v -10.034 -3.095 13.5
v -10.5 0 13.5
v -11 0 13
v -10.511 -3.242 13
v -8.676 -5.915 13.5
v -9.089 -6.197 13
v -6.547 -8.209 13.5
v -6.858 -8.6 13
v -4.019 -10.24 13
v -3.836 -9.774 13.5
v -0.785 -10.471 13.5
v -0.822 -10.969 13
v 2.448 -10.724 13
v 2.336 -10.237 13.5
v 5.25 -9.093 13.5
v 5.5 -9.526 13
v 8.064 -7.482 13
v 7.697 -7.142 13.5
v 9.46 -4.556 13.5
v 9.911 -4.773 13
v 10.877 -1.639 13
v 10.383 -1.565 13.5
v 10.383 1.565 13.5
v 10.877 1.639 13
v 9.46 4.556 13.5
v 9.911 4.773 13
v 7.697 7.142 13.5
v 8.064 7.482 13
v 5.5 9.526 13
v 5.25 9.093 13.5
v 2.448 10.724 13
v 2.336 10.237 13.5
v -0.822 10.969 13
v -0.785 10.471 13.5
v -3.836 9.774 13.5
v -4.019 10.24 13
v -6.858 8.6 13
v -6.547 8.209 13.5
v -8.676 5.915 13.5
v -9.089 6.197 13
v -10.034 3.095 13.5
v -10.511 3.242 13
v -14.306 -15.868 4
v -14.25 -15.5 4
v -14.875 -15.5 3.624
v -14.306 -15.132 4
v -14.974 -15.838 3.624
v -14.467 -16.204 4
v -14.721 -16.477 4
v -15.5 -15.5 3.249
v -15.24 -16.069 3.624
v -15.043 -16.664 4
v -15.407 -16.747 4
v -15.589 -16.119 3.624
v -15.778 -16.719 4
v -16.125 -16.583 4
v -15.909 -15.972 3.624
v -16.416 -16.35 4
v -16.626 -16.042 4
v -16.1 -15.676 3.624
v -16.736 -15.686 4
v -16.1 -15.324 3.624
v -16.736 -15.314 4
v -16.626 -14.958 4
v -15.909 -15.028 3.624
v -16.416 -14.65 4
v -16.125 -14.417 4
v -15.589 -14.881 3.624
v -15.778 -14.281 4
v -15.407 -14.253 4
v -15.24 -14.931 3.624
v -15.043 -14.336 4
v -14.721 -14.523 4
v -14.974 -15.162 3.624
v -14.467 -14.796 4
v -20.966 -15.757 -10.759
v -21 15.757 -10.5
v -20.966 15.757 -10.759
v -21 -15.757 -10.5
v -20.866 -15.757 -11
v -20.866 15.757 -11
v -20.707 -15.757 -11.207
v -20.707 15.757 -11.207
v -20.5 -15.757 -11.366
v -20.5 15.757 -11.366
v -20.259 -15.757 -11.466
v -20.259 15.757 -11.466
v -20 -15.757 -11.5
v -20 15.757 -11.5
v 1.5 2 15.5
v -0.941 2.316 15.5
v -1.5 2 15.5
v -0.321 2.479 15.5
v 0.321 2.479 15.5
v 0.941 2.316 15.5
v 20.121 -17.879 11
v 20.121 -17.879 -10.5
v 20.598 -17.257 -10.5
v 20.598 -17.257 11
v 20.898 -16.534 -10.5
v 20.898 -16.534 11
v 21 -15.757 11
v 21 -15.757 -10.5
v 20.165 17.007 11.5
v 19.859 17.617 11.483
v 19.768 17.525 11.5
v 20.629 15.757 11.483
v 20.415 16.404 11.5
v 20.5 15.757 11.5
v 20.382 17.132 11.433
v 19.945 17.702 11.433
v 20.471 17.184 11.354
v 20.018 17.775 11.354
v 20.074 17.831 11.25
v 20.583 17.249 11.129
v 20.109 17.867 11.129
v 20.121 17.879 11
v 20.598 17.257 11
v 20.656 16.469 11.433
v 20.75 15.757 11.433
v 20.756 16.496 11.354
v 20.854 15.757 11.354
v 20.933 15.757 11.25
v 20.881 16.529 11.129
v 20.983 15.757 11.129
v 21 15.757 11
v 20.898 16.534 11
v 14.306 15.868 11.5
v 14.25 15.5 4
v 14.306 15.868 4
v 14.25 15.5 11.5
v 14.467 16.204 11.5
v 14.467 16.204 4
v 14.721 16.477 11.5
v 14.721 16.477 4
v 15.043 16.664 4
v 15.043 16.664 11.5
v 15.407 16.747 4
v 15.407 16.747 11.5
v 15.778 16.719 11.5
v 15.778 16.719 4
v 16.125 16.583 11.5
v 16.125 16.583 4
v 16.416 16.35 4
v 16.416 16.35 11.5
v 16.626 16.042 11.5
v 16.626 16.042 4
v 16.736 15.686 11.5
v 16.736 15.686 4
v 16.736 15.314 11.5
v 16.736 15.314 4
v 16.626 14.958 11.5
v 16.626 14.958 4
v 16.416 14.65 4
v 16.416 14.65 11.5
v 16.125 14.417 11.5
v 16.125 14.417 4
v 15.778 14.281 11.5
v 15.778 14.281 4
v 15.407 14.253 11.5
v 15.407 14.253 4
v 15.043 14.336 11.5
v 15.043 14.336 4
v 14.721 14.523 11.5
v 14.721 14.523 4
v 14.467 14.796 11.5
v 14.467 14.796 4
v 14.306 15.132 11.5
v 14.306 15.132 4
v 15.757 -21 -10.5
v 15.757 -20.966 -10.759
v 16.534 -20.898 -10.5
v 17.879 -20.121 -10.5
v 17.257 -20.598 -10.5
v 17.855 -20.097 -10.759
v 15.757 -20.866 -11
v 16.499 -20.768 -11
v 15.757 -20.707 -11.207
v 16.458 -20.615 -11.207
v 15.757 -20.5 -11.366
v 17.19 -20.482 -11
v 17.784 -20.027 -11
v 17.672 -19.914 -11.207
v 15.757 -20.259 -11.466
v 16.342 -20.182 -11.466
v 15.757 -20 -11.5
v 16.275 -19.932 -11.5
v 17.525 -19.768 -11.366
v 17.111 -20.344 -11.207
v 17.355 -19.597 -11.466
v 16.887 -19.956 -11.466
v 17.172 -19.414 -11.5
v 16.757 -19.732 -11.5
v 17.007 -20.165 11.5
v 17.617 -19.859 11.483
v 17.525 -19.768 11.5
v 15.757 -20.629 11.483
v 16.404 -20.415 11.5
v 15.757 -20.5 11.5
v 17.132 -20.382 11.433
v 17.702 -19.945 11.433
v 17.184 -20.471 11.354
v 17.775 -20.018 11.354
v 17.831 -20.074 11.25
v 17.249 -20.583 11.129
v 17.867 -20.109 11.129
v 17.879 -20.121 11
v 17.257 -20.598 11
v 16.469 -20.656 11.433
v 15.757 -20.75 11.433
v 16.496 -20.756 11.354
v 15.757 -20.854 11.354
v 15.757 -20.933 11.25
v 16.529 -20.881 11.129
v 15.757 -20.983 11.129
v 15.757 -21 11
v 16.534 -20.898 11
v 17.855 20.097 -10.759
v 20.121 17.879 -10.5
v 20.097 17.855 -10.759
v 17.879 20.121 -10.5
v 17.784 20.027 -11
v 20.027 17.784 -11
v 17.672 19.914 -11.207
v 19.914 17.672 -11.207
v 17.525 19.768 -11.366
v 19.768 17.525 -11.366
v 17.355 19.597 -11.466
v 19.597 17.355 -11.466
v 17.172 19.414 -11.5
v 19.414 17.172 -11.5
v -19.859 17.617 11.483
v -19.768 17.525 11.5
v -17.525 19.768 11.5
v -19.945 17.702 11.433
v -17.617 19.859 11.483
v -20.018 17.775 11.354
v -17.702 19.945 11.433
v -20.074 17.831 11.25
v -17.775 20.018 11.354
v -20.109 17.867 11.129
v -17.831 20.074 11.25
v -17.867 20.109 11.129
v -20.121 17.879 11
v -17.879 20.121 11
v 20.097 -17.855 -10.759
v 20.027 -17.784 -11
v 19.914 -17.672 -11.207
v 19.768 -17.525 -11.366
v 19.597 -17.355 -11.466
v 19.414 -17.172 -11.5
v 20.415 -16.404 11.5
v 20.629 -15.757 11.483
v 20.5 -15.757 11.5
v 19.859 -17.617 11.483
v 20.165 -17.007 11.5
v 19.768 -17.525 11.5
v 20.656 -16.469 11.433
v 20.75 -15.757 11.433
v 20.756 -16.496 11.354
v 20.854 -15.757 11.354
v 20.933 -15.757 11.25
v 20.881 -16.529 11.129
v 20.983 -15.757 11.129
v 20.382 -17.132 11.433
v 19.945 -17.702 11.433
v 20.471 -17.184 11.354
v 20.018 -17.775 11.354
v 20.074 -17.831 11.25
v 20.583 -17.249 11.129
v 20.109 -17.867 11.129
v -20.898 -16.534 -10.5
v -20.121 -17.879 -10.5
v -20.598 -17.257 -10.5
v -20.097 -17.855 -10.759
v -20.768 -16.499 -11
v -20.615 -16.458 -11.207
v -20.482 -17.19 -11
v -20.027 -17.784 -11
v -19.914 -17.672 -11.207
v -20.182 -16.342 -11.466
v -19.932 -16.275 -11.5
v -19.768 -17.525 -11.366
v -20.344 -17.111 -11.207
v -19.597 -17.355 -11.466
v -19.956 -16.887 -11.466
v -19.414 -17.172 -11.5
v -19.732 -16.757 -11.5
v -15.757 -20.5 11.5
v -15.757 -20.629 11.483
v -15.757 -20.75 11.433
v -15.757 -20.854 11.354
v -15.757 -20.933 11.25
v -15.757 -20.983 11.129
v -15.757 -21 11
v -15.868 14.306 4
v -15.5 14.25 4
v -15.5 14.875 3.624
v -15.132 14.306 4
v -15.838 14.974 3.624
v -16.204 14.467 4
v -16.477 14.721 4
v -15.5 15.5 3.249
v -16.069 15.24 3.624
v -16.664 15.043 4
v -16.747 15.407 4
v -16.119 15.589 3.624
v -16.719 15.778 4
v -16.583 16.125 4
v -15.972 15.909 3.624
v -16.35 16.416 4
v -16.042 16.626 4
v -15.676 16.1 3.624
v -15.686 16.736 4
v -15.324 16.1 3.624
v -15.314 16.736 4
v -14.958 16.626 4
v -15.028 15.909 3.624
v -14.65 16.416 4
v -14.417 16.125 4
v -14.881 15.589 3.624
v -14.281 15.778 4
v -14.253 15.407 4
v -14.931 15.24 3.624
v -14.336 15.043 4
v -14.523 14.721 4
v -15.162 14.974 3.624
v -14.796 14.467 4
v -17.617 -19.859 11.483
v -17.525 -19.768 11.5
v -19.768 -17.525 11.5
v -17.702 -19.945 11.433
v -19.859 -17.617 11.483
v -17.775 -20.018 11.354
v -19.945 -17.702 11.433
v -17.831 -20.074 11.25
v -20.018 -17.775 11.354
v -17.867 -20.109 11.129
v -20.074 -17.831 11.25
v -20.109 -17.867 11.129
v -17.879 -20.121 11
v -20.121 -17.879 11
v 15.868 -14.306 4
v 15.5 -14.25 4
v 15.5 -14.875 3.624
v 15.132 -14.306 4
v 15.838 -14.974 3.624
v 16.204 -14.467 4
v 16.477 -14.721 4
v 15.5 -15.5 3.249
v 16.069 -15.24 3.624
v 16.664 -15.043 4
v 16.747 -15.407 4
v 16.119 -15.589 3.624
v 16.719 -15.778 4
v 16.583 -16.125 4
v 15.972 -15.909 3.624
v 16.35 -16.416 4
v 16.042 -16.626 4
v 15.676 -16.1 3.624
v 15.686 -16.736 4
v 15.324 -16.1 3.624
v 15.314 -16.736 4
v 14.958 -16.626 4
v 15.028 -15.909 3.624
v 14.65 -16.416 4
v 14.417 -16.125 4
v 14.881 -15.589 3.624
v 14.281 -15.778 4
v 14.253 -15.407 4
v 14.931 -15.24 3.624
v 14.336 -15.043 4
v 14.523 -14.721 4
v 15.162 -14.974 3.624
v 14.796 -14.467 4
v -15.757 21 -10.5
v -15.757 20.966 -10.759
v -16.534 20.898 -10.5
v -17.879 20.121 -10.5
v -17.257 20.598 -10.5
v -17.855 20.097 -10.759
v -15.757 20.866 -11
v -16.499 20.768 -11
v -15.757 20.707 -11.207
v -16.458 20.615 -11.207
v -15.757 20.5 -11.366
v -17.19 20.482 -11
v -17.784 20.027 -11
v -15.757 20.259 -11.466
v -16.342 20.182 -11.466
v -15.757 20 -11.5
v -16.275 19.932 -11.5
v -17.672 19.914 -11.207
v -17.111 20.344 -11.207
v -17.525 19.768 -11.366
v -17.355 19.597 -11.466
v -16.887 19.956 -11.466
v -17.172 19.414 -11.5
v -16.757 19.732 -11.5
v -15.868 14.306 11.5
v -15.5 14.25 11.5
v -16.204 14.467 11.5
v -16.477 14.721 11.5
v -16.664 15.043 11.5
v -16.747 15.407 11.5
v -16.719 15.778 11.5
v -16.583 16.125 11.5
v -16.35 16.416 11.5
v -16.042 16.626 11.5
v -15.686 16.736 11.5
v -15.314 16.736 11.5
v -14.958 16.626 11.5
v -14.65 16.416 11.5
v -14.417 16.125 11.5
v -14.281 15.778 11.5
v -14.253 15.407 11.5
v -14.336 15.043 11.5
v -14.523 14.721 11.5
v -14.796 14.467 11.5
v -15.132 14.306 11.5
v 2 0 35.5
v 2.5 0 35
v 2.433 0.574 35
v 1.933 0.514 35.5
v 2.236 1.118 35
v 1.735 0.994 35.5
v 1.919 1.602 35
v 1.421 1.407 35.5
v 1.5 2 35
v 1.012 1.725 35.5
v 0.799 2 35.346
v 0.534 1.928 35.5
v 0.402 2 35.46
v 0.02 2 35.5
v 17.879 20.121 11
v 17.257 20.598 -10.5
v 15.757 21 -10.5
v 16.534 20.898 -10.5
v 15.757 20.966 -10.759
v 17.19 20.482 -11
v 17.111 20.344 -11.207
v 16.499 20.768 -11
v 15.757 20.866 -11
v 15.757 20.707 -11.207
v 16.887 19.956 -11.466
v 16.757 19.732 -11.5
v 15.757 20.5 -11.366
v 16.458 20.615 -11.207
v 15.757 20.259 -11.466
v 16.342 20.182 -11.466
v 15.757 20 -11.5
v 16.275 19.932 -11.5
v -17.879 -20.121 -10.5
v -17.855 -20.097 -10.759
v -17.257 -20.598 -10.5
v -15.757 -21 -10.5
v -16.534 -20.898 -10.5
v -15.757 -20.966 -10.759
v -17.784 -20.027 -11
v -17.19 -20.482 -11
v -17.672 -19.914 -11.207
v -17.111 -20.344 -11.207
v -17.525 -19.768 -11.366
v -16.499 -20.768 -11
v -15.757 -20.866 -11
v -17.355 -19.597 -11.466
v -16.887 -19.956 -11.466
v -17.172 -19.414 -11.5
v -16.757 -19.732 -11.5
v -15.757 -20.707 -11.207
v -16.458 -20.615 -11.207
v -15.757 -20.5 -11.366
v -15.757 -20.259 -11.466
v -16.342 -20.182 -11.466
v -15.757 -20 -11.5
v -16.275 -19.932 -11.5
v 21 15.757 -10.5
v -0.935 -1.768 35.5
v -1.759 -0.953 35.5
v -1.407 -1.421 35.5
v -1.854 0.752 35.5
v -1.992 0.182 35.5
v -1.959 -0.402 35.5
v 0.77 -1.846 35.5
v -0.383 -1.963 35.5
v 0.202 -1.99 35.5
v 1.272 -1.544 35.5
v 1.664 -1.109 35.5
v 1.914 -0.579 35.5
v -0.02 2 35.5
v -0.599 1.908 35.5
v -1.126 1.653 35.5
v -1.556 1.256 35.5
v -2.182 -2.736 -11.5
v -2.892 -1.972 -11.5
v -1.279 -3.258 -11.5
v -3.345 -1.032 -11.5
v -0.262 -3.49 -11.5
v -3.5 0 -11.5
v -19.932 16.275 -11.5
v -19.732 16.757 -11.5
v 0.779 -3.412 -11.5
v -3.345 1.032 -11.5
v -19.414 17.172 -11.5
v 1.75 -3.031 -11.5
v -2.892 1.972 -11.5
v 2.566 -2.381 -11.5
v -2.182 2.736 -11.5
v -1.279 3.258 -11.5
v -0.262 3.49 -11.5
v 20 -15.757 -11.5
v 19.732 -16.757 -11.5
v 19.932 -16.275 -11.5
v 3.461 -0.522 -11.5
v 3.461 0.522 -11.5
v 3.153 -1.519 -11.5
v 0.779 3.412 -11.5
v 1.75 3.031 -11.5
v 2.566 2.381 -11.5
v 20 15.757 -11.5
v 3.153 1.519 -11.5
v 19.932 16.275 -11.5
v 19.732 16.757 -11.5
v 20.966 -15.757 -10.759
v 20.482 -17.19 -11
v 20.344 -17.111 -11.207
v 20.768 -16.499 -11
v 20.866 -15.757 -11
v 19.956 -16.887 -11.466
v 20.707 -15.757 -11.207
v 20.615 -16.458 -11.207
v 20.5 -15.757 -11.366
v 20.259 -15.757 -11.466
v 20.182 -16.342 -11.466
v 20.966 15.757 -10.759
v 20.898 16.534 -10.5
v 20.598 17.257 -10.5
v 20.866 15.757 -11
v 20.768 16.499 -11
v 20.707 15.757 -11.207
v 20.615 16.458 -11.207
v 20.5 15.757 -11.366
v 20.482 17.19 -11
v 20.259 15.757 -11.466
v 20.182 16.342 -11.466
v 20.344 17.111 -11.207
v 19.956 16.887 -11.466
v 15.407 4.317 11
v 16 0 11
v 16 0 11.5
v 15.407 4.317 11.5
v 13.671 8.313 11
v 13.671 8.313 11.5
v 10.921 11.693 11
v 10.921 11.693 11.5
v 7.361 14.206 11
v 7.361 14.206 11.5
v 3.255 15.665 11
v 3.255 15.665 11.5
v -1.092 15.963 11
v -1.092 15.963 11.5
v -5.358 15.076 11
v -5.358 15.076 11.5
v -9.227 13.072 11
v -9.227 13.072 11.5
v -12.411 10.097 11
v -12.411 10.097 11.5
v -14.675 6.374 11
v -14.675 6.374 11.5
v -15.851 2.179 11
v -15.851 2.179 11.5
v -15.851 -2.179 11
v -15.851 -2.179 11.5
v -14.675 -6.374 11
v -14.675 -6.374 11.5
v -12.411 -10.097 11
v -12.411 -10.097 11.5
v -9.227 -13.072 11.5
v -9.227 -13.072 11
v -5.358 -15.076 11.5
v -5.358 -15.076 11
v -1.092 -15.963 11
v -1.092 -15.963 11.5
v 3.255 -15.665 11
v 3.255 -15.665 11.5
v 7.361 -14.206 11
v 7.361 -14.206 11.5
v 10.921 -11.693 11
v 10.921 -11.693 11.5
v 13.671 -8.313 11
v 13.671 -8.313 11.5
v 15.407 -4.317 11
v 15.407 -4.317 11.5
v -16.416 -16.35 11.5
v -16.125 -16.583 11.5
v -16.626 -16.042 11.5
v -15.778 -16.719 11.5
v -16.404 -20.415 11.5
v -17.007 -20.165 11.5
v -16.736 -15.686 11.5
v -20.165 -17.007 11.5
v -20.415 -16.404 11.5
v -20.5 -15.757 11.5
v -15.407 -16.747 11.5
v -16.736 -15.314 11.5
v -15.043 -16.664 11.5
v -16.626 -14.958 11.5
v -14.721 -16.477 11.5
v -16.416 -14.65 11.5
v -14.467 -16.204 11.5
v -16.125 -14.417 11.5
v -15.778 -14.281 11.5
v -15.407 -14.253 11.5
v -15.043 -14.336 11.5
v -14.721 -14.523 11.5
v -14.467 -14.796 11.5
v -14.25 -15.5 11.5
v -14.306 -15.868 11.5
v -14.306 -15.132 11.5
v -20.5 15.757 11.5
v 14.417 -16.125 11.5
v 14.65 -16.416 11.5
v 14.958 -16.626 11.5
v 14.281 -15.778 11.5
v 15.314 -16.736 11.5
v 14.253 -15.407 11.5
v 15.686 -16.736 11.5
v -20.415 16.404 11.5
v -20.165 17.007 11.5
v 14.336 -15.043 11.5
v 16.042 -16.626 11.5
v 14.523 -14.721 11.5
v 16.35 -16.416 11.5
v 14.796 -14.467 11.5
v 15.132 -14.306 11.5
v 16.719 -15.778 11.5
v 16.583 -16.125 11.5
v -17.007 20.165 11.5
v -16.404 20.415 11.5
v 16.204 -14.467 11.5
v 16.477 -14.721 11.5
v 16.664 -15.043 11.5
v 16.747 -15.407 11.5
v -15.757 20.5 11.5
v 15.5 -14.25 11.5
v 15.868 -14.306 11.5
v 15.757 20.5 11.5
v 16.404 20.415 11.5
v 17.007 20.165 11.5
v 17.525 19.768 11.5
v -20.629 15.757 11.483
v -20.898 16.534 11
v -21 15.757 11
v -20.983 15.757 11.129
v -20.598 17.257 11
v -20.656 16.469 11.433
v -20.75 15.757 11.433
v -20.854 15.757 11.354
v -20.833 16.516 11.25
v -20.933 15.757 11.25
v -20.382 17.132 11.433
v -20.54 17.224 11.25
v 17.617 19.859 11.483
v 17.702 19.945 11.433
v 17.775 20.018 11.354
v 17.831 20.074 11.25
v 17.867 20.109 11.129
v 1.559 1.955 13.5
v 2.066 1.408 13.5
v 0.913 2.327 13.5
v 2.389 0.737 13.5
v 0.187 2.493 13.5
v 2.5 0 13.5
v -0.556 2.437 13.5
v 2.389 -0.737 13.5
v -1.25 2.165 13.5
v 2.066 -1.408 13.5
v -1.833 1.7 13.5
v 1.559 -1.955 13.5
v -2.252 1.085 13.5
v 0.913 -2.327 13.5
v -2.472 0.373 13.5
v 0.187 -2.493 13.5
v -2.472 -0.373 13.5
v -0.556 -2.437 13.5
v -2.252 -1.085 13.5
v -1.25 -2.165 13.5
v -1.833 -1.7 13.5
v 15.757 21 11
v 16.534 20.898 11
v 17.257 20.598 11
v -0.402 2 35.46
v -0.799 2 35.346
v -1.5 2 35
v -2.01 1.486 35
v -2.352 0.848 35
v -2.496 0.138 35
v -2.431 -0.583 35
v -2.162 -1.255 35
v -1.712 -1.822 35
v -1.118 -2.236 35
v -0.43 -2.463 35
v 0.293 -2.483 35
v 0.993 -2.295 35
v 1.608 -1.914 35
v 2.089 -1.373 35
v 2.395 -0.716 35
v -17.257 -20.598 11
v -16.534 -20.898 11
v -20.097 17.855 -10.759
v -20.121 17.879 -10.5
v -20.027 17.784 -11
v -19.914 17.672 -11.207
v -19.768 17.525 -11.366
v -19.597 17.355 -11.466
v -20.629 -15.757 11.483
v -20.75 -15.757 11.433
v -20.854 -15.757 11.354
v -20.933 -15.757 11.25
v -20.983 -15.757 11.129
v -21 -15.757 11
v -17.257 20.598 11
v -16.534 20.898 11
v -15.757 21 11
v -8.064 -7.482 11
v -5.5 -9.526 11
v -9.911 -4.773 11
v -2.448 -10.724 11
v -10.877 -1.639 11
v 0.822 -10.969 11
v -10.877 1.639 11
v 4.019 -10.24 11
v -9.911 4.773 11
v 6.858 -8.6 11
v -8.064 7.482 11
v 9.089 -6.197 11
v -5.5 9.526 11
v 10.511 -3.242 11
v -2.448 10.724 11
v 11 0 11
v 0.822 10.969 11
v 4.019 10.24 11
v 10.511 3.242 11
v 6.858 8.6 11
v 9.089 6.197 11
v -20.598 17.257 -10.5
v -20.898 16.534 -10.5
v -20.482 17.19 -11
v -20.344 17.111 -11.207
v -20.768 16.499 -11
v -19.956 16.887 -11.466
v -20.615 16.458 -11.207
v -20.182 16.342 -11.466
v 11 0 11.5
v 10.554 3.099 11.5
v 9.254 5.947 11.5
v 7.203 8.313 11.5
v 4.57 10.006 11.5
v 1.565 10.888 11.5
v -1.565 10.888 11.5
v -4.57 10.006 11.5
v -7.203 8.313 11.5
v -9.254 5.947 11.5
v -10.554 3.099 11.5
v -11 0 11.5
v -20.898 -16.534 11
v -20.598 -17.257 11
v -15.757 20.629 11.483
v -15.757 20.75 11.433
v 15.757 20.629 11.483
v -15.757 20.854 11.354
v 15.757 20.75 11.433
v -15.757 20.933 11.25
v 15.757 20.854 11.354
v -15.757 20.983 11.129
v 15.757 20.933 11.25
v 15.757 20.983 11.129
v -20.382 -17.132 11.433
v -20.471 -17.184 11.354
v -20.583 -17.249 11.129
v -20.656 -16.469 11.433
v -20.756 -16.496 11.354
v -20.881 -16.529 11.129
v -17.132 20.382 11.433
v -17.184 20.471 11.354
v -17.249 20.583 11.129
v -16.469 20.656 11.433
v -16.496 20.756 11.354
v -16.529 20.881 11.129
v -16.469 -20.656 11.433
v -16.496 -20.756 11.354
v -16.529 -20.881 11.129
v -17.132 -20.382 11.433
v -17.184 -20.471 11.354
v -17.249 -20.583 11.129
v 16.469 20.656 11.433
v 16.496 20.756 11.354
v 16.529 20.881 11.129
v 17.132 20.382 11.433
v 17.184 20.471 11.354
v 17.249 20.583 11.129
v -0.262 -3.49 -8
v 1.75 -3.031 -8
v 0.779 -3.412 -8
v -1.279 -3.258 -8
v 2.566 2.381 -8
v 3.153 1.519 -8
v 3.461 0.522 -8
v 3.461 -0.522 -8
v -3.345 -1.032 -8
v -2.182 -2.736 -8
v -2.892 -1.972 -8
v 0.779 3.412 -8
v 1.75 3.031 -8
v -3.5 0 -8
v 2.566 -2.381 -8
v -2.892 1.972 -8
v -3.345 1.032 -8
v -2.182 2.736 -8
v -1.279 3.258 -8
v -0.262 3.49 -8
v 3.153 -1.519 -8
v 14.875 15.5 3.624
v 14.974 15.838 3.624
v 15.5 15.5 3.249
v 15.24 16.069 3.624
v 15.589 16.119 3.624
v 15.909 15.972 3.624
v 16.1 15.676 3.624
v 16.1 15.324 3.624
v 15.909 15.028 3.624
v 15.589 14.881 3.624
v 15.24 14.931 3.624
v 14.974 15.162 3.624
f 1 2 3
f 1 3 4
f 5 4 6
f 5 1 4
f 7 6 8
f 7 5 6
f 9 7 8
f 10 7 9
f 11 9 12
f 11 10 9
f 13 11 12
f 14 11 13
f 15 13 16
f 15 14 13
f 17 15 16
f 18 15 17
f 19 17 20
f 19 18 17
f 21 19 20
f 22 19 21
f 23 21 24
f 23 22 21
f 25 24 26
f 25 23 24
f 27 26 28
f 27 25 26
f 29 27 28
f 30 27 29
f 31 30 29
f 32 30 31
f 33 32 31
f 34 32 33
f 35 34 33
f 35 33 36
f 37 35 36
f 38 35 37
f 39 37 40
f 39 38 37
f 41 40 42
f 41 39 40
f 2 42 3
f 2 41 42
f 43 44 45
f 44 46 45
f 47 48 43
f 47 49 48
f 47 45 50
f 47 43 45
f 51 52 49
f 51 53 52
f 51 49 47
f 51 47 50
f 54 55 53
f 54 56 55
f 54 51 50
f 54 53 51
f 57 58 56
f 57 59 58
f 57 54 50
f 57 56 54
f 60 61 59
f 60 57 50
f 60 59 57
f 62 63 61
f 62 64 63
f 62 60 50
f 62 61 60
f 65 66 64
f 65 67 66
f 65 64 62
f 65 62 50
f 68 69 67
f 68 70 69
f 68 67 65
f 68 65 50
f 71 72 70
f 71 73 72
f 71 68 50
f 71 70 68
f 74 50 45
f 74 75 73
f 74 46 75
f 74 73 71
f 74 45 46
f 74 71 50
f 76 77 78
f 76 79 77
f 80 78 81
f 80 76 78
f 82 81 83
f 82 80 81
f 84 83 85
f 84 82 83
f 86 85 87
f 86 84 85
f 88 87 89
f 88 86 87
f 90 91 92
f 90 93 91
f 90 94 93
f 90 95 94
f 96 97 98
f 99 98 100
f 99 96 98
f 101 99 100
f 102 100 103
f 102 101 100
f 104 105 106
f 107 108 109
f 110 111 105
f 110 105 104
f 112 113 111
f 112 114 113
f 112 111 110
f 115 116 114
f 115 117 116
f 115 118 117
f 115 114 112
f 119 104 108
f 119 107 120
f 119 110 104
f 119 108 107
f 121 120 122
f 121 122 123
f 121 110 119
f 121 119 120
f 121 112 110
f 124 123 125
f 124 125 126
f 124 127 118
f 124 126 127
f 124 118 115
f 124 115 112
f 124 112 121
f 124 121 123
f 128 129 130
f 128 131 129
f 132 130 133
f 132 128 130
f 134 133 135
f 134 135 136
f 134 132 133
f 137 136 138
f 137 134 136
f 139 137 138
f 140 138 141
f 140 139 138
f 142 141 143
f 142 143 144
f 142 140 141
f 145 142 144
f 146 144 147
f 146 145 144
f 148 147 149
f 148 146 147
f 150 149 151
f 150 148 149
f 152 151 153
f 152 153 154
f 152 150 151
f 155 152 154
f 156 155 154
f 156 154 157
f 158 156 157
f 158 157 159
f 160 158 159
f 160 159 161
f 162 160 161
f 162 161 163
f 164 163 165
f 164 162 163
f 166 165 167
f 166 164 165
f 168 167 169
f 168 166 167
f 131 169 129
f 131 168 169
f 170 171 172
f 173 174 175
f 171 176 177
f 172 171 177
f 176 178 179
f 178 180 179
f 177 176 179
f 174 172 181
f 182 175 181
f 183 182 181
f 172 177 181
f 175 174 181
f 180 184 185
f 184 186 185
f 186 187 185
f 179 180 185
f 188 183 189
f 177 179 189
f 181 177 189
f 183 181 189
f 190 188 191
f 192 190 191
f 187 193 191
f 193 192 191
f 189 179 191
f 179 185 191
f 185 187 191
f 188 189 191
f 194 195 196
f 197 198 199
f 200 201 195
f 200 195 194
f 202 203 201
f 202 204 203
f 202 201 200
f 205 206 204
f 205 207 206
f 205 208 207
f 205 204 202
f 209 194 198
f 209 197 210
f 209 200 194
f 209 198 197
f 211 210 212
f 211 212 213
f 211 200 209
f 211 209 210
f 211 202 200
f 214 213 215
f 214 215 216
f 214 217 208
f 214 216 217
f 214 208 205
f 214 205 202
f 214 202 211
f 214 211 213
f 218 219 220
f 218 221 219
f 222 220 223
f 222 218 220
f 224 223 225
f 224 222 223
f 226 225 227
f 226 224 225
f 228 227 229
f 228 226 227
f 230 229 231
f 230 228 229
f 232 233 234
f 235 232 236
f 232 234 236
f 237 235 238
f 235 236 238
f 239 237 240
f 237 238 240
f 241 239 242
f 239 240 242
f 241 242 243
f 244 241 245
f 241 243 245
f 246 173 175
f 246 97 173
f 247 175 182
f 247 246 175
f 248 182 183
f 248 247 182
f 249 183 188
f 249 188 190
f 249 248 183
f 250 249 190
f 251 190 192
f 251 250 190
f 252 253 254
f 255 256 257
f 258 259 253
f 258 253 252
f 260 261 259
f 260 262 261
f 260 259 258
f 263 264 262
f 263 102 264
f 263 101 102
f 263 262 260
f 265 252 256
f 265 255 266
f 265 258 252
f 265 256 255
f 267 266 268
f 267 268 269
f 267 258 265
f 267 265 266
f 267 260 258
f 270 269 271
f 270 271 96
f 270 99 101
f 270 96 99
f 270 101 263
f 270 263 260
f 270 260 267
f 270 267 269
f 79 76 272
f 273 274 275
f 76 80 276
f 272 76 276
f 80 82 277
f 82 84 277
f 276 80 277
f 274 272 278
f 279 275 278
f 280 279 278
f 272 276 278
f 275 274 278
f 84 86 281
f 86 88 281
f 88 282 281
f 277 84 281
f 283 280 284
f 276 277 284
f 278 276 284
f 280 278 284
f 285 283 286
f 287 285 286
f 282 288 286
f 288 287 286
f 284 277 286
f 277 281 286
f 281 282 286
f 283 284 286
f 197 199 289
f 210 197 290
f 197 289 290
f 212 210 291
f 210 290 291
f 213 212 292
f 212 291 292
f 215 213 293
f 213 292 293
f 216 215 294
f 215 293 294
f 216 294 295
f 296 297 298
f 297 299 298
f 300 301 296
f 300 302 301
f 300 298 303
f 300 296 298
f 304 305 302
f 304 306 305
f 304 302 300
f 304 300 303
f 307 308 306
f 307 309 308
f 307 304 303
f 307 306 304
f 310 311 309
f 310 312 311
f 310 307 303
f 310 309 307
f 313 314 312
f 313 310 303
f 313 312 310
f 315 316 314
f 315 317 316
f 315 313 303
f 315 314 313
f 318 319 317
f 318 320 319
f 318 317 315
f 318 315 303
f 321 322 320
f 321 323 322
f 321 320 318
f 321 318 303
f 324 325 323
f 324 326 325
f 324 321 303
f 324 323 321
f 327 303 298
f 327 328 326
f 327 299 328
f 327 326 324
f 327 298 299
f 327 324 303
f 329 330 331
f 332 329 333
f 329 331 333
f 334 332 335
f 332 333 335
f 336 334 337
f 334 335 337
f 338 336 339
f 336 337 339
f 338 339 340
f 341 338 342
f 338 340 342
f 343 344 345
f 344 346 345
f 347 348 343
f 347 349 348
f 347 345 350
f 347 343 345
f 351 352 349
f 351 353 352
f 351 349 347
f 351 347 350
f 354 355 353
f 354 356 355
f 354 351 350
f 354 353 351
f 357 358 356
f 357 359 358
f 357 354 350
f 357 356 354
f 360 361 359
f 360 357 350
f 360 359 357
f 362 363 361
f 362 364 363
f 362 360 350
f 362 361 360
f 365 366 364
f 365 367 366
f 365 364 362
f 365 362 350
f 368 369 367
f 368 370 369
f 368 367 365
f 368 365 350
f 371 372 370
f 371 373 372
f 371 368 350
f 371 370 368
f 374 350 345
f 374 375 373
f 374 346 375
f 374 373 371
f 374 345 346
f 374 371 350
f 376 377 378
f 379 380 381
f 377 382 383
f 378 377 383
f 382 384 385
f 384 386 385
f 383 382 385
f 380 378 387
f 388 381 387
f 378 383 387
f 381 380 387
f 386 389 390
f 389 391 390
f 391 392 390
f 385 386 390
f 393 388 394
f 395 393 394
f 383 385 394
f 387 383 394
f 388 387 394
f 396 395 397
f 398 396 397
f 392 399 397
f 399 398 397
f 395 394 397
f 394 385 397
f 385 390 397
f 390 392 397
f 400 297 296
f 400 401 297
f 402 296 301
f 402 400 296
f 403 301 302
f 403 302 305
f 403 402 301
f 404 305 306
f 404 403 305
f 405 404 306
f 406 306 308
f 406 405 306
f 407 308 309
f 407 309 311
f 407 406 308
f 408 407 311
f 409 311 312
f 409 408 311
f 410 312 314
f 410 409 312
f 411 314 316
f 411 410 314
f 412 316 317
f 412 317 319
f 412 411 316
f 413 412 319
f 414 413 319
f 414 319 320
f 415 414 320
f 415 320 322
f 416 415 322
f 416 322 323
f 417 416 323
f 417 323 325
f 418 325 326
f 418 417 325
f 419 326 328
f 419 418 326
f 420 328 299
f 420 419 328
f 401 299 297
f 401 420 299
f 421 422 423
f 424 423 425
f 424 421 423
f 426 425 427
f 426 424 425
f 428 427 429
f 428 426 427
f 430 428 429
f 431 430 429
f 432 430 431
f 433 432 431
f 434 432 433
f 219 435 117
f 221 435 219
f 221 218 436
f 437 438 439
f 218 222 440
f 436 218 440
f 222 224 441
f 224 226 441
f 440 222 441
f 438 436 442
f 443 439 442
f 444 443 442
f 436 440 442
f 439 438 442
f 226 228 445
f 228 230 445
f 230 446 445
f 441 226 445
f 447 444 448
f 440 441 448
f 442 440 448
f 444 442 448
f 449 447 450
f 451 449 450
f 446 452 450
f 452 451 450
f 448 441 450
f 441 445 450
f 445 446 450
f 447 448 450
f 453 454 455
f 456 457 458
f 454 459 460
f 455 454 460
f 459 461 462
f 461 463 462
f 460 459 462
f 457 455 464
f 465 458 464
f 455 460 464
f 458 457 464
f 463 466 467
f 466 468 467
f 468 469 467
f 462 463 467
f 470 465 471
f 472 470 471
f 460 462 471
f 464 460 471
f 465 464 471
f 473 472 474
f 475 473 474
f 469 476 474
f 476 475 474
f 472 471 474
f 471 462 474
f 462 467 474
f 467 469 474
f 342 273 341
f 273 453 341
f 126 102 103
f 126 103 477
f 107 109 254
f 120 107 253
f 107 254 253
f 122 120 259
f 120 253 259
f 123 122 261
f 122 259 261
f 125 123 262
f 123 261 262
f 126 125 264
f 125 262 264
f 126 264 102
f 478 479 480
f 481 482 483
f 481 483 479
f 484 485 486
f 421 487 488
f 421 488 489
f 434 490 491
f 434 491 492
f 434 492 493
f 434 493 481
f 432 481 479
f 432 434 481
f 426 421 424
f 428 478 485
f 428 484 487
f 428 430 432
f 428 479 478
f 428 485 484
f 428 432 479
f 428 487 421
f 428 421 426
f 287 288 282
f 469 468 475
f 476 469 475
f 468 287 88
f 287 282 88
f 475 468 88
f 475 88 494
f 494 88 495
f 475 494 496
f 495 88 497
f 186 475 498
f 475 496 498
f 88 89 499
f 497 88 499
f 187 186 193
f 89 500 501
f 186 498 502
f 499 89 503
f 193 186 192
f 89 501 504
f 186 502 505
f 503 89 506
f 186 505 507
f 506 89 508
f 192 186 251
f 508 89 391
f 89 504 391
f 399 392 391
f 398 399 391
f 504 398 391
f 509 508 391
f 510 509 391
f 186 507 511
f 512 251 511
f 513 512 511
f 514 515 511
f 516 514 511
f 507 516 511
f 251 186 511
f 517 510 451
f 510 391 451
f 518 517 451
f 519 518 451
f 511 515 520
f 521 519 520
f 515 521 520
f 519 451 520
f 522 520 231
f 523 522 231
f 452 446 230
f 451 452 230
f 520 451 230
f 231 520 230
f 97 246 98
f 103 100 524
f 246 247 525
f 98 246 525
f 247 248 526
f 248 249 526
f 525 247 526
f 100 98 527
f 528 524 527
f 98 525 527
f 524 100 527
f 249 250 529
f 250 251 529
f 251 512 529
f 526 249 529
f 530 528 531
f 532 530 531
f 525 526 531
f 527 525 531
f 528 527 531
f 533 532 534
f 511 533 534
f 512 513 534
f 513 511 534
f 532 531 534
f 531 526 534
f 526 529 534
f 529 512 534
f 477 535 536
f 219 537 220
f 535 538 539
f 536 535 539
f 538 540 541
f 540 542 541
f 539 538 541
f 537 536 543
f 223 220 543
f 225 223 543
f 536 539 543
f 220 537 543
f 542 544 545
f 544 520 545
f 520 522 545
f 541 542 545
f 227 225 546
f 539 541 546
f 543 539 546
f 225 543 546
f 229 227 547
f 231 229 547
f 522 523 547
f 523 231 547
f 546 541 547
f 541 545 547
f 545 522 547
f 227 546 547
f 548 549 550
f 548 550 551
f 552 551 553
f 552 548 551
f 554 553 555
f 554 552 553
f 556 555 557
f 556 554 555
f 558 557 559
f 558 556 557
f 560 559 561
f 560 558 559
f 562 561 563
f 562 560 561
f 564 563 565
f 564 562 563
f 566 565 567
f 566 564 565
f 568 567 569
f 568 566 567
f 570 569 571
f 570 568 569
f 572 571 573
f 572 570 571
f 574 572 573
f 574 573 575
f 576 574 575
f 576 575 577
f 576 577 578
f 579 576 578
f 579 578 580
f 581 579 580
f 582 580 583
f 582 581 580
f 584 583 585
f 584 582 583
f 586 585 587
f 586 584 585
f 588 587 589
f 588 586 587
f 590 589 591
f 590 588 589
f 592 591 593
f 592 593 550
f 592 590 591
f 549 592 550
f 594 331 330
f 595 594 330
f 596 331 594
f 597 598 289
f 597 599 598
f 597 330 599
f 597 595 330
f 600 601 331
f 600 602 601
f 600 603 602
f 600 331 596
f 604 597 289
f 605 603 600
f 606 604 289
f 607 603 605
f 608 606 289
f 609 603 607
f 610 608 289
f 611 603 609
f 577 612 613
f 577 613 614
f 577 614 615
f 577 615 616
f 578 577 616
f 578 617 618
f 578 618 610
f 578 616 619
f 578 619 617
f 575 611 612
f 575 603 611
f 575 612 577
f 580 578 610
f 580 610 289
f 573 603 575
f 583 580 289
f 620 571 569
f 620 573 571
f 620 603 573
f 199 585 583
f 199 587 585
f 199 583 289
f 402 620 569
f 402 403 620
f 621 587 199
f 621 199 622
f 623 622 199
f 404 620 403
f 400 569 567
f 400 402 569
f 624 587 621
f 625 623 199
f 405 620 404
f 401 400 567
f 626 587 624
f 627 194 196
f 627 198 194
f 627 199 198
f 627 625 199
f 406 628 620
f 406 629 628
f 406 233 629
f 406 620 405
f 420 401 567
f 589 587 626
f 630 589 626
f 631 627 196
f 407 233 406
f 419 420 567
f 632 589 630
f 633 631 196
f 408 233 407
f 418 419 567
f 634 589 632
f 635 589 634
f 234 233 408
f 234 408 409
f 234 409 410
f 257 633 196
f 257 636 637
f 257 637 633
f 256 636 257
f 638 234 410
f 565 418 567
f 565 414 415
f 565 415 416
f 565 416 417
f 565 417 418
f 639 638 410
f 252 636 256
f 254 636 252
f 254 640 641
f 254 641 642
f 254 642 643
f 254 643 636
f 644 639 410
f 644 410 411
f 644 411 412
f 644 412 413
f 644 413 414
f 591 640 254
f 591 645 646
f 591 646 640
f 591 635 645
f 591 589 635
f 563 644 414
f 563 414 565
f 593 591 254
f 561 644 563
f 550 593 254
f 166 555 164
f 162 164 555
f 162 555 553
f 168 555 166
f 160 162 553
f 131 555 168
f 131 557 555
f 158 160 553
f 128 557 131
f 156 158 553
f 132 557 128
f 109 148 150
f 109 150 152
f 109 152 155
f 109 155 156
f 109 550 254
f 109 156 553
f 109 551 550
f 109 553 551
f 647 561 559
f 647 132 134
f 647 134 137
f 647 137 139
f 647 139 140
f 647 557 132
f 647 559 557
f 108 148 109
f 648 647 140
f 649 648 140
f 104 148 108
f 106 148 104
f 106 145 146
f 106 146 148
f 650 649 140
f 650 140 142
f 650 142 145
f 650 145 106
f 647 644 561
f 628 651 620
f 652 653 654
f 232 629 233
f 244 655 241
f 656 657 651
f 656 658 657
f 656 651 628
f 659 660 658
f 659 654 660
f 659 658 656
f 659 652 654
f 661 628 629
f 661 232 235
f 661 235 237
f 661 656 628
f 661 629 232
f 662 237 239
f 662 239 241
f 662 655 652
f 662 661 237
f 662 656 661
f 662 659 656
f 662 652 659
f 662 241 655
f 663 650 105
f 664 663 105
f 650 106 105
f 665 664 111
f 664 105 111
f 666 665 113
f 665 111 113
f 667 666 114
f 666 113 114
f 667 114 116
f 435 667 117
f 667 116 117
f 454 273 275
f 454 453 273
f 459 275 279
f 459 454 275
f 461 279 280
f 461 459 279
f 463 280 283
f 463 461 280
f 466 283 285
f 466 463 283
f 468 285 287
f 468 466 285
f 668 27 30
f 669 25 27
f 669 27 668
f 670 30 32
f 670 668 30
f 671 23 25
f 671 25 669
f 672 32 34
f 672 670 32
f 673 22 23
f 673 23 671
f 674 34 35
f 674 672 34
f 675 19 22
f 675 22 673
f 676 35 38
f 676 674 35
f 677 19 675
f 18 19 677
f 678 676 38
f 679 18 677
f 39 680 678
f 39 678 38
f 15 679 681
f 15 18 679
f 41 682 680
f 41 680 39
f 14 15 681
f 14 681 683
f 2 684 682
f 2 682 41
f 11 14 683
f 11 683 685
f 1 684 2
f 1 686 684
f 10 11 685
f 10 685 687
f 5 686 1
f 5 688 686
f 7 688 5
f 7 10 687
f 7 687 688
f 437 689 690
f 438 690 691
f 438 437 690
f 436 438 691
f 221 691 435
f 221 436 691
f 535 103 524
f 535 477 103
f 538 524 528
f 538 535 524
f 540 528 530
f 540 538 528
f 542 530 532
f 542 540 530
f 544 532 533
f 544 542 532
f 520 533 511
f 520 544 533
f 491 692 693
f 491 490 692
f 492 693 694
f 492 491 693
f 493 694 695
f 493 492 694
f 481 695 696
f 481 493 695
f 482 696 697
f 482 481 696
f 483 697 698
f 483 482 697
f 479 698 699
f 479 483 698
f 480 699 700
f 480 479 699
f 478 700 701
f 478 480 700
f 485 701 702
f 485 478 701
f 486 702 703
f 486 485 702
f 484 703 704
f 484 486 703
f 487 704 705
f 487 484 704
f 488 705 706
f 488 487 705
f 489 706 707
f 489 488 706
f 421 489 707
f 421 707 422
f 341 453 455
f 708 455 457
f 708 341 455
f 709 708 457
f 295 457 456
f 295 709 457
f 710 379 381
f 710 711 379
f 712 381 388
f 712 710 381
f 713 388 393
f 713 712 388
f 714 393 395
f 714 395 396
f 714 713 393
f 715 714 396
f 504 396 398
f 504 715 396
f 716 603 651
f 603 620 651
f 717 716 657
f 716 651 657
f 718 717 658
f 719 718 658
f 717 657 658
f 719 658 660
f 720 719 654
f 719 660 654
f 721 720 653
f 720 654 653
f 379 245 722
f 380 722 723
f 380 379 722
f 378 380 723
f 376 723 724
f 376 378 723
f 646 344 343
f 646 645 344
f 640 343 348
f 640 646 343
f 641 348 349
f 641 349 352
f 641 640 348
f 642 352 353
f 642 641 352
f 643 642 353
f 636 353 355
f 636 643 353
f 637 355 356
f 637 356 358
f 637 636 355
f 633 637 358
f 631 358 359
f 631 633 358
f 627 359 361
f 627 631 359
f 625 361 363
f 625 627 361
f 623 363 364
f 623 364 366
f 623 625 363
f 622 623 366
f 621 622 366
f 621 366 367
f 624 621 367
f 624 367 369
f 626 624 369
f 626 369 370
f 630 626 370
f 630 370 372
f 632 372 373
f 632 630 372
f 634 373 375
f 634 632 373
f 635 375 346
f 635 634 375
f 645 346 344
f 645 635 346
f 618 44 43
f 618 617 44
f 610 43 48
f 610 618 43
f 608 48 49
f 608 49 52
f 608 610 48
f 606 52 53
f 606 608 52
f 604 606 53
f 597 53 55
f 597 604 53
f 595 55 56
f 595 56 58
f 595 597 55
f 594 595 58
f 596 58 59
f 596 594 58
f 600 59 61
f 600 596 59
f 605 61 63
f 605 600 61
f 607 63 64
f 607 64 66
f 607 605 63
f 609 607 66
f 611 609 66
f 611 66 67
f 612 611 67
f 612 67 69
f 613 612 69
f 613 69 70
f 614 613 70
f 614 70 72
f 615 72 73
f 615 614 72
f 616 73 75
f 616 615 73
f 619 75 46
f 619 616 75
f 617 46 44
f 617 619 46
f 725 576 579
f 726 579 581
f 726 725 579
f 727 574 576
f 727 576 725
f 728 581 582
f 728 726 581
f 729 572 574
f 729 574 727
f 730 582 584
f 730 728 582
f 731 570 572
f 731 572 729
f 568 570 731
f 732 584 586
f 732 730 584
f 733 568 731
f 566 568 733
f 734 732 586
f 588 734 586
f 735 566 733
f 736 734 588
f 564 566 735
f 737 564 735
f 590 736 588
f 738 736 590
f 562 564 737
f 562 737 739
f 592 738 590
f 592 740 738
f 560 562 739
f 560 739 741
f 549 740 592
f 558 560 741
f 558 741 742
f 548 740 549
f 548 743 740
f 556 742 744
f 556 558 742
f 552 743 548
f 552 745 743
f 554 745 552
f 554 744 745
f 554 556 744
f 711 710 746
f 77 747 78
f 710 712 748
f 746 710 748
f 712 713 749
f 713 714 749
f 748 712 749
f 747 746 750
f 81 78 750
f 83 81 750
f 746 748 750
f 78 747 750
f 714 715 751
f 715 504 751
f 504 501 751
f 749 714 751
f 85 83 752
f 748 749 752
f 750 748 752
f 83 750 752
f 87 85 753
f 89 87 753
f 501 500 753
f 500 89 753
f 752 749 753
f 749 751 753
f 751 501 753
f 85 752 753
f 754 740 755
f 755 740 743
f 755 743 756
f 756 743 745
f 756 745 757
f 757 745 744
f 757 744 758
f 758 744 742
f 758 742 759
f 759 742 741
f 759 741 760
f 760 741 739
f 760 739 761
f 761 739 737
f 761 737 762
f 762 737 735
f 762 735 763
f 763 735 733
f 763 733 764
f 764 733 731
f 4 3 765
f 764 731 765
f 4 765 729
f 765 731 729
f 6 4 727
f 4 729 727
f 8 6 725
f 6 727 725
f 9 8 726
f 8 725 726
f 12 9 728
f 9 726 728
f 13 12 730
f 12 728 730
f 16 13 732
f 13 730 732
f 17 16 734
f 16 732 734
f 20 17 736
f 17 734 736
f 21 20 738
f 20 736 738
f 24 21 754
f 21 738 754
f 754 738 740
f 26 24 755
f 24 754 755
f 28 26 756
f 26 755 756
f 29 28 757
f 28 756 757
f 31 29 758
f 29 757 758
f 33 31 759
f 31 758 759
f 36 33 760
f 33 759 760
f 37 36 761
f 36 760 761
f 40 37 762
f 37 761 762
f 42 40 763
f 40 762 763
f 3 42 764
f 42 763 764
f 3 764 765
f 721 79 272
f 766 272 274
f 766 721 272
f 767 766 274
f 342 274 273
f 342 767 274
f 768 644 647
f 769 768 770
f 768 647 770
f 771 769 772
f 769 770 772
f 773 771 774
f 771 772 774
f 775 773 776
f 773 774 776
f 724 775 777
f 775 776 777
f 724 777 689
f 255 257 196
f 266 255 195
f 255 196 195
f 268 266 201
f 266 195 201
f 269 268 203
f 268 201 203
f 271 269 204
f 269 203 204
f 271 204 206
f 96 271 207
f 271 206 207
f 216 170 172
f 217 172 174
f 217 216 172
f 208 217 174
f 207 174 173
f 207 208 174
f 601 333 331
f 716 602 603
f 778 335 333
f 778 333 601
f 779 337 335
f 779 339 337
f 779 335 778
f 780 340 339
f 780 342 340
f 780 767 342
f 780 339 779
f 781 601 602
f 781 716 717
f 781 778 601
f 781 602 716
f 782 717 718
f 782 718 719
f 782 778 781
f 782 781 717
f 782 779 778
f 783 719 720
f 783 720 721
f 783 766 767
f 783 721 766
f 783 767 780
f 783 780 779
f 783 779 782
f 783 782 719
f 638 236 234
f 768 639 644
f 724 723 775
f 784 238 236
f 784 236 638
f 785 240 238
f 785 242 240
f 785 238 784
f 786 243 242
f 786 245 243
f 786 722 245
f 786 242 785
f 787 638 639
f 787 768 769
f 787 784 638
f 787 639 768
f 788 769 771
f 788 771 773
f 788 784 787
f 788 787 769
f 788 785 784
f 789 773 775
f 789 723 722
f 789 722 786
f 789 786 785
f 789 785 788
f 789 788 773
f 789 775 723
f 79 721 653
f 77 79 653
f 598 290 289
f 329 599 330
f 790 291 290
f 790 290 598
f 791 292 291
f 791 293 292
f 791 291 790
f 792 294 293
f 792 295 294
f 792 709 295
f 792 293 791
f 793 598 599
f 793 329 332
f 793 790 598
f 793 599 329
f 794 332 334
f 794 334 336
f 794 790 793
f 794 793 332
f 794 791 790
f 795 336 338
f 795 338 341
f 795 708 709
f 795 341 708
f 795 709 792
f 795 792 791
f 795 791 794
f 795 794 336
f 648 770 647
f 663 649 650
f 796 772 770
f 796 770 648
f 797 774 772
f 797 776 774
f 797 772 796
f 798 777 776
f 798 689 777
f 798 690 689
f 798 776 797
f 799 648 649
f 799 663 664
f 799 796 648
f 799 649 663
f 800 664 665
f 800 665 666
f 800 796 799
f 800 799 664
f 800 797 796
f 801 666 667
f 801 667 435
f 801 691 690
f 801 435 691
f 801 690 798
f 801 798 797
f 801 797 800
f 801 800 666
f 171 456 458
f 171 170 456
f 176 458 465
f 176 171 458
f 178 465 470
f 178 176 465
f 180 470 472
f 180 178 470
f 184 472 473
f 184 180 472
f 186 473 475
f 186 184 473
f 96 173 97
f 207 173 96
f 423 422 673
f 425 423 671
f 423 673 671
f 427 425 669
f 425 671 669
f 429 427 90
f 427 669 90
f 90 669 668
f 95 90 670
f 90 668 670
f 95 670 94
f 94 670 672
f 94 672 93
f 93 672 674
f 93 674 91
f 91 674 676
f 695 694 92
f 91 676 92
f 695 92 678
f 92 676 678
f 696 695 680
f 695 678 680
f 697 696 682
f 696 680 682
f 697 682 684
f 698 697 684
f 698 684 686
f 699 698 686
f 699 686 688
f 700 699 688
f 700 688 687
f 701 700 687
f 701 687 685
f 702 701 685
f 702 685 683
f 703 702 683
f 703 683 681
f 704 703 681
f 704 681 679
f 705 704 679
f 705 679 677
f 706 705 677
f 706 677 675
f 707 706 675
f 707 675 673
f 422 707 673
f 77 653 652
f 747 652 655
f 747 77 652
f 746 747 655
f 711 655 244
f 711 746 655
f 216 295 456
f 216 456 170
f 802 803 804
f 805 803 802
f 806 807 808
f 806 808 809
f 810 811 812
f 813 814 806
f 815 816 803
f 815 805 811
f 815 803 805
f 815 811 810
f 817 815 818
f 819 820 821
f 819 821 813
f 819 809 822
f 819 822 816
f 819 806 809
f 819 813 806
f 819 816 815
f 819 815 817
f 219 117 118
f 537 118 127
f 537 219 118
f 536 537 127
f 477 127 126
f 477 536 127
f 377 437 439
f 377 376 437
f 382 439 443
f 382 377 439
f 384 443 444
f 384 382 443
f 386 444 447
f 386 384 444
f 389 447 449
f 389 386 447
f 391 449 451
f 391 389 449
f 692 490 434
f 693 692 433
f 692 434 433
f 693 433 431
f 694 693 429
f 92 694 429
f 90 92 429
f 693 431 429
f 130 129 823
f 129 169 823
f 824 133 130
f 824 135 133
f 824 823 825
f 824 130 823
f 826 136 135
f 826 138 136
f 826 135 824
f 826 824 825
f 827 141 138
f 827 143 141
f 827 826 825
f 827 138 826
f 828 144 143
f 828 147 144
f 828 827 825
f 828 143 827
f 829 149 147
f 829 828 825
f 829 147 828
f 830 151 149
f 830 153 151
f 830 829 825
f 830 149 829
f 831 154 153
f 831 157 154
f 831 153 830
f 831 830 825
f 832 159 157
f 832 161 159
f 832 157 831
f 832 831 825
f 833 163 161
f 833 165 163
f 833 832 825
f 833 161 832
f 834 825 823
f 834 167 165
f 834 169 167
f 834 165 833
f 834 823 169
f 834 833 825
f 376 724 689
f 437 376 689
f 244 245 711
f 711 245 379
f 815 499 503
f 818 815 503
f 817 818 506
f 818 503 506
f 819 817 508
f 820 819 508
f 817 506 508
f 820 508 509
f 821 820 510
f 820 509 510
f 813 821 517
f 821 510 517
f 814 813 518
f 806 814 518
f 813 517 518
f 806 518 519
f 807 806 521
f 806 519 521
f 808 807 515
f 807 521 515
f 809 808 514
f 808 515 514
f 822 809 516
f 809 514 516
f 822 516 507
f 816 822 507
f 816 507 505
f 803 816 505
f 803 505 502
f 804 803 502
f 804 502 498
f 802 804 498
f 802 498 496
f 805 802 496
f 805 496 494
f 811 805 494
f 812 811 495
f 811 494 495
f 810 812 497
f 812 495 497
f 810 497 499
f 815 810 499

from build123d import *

# Parameters (mm, degrees)
SKETCH1_W           = 42
SKETCH1_H           = 42
BOSS_EXTRUDE1_DEPTH = 11.5
CHAMFER1_SIZE       = 4
SKETCH2_R           = 11
BOSS_EXTRUDE2_DEPTH = 2
CUT_EXTRUDE1_START  = -0.5
SKETCH3_R           = 16
SKETCH3_R_2         = 11
CUT_EXTRUDE1_DEPTH  = 0.5
SKETCH4_R           = 2.5
BOSS_EXTRUDE3_DEPTH = 22
SKETCH5_W           = 10.364275964
SKETCH5_H           = 1.526028363
CUT_EXTRUDE2_DEPTH  = 20
CIRPATTERN1_COUNT   = 4
FILLET1_R           = 3
CHAMFER2_SIZE       = 0.5
FILLET2_R           = 1
FILLET3_R           = 0.5
SKETCH9_R           = 3.5
CUT_EXTRUDE3_DEPTH  = 3.5


with BuildPart() as part:
    # Sketch1 → Boss-Extrude1 (new, symmetric)
    with BuildSketch(Plane.XY):
        Rectangle(SKETCH1_W, SKETCH1_H)
    extrude(amount=BOSS_EXTRUDE1_DEPTH, both=True)

    # Chamfer1
    chamfer1_edges = [part.edges().sort_by_distance(p)[0] for p in [
        (21, -21, 0),
        (-21, -21, 0),
        (-21, 21, 0),
        (21, 21, 0),
    ]]
    chamfer(chamfer1_edges, length=CHAMFER1_SIZE)

    # Sketch2 → Boss-Extrude2 (add)
    with BuildSketch(Plane.XY.offset(11.5)):
        with Locations(Location((0, 0, 0), (0, 0, 180))):
            Circle(SKETCH2_R)
    extrude(amount=BOSS_EXTRUDE2_DEPTH)

    # Sketch3 → Cut-Extrude1 (cut)
    with BuildSketch(Plane.XY.offset(11.5).offset(CUT_EXTRUDE1_START)):
        Circle(SKETCH3_R)
        Circle(SKETCH3_R_2, mode=Mode.SUBTRACT)
    extrude(amount=CUT_EXTRUDE1_DEPTH, mode=Mode.SUBTRACT)

    # Sketch4 → Boss-Extrude3 (add)
    with BuildSketch(Plane.XY.offset(13.5)):
        Circle(SKETCH4_R)
    extrude(amount=BOSS_EXTRUDE3_DEPTH)

    # Sketch5 → Cut-Extrude2 (cut)
    with BuildSketch(Plane.XY.offset(35.5)):
        with Locations((0.738499094, 2.763014181)):
            Rectangle(SKETCH5_W, SKETCH5_H)
    extrude(amount=-CUT_EXTRUDE2_DEPTH, mode=Mode.SUBTRACT)

    # Sketch7 → M3x0.5 Tapped Hole1 (revolve, cut)
    with BuildSketch(Plane(origin=(-15.5, 15.5, 11.5), x_dir=(0, -1, 0), z_dir=(1, 0, 0))):
        Polygon((0, 0), (0, 8.251075774), (1.25, 7.5), (1.25, 0), align=None)
    m3x0_5_tapped_hole1 = revolve(axis=Axis((-15.5, 15.5, 17.85), (0, 0, -1)), mode=Mode.SUBTRACT)

    # CirPattern1: M3x0.5 Tapped Hole1 ×4 about axis
    cirpattern1_axis = Axis((0, 0, 0), (0, 0, 1))
    for i in range(1, CIRPATTERN1_COUNT):
        add(m3x0_5_tapped_hole1.rotate(cirpattern1_axis, i * 360 / CIRPATTERN1_COUNT), mode=Mode.SUBTRACT)

    # Fillet1
    fillet1_edges = [part.edges().sort_by_distance(p)[0] for p in [
        (17, -21, 0),
        (-17, -21, 0),
        (-21, 17, 0),
        (-21, -17, 0),
        (21, 17, 0),
        (21, -17, 0),
        (17, 21, 0),
        (-17, 21, 0),
    ]]
    fillet(fillet1_edges, radius=FILLET1_R)

    # Chamfer2
    chamfer2_edges = [part.edges().sort_by_distance(p)[0] for p in [
        (-1.118033989, -2.236067977, 35.5),
        (11, 0, 13.5),
    ]]
    chamfer(chamfer2_edges, length=CHAMFER2_SIZE - 0.0001)  # a hair under: the kernel refuses the full size

    # Fillet2
    fillet2_edges = [part.edges().sort_by_distance(p)[0] for p in [
        (-19, -19, -11.5),
        (0, -21, -11.5),
        (-19, 19, -11.5),
        (0, 21, -11.5),
        (19, 19, -11.5),
        (21, 0, -11.5),
        (19, -19, -11.5),
        (-16.90540961, 20.771638598, -11.5),
        (-20.771638598, 16.90540961, -11.5),
        (16.90540961, 20.771638598, -11.5),
        (20.771638598, 16.90540961, -11.5),
        (20.771638598, -16.90540961, -11.5),
        (16.90540961, -20.771638598, -11.5),
        (-16.90540961, -20.771638598, -11.5),
        (-20.771638598, -16.90540961, -11.5),
        (-21, 0, -11.5),
    ]]
    fillet(fillet2_edges, radius=FILLET2_R)

    # Fillet3
    fillet3_edges = [part.edges().sort_by_distance(p)[0] for p in [
        (-20.771638598, 16.90540961, 11.5),
        (16.90540961, 20.771638598, 11.5),
        (20.771638598, 16.90540961, 11.5),
        (20.771638598, -16.90540961, 11.5),
        (16.90540961, -20.771638598, 11.5),
        (-16.90540961, -20.771638598, 11.5),
        (-20.771638598, -16.90540961, 11.5),
        (-21, 0, 11.5),
        (-19, -19, 11.5),
        (0, -21, 11.5),
        (19, -19, 11.5),
        (21, 0, 11.5),
        (19, 19, 11.5),
        (0, 21, 11.5),
        (-19, 19, 11.5),
        (-16.90540961, 20.771638598, 11.5),
    ]]
    fillet(fillet3_edges, radius=FILLET3_R)

    # Sketch9 → Cut-Extrude3 (cut)
    with BuildSketch(Plane(origin=(0, 0, -11.5), x_dir=(-1, 0, 0), z_dir=(0, 0, -1))):
        Circle(SKETCH9_R)
    extrude(amount=-CUT_EXTRUDE3_DEPTH, mode=Mode.SUBTRACT)


solid = part.part
